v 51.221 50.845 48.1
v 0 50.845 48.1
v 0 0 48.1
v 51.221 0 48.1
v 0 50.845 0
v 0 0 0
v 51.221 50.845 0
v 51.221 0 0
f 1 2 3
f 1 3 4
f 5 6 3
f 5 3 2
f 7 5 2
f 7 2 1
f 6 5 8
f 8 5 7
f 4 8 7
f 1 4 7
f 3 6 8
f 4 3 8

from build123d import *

# Parameters (mm, degrees)
F0_W     = 51.221348
F0_H     = 50.845277
F1_DEPTH = 48.1
F3_W     = 25.422638
F3_H     = 25.293316
F4_DEPTH = 48.1
F2_W     = 51.221348
F2_H     = 25.422638
F5_DEPTH = 25.4


with BuildPart() as f1:
    # F0 (on Top) → F1 (new body)
    with BuildSketch(Plane.XY):
        with Locations((25.610674, 25.422638)):
            Rectangle(F0_W, F0_H)
    extrude(amount=F1_DEPTH)

    # F3 (on face) → F4 (join)
    with BuildSketch(Plane(origin=(0, 0, 0), x_dir=(0, -1, 0), z_dir=(-1, 0, 0))):
        with Locations((-12.711319, 35.453342)):
            Rectangle(F3_W, F3_H)
    extrude(amount=-F4_DEPTH)

    # F2 (on face) → F5 (join)
    with BuildSketch(Plane.XY.offset(48.1)):
        with Locations((25.610674, 12.711319)):
            Rectangle(F2_W, F2_H)
    extrude(amount=-F5_DEPTH)


solid = f1.part
